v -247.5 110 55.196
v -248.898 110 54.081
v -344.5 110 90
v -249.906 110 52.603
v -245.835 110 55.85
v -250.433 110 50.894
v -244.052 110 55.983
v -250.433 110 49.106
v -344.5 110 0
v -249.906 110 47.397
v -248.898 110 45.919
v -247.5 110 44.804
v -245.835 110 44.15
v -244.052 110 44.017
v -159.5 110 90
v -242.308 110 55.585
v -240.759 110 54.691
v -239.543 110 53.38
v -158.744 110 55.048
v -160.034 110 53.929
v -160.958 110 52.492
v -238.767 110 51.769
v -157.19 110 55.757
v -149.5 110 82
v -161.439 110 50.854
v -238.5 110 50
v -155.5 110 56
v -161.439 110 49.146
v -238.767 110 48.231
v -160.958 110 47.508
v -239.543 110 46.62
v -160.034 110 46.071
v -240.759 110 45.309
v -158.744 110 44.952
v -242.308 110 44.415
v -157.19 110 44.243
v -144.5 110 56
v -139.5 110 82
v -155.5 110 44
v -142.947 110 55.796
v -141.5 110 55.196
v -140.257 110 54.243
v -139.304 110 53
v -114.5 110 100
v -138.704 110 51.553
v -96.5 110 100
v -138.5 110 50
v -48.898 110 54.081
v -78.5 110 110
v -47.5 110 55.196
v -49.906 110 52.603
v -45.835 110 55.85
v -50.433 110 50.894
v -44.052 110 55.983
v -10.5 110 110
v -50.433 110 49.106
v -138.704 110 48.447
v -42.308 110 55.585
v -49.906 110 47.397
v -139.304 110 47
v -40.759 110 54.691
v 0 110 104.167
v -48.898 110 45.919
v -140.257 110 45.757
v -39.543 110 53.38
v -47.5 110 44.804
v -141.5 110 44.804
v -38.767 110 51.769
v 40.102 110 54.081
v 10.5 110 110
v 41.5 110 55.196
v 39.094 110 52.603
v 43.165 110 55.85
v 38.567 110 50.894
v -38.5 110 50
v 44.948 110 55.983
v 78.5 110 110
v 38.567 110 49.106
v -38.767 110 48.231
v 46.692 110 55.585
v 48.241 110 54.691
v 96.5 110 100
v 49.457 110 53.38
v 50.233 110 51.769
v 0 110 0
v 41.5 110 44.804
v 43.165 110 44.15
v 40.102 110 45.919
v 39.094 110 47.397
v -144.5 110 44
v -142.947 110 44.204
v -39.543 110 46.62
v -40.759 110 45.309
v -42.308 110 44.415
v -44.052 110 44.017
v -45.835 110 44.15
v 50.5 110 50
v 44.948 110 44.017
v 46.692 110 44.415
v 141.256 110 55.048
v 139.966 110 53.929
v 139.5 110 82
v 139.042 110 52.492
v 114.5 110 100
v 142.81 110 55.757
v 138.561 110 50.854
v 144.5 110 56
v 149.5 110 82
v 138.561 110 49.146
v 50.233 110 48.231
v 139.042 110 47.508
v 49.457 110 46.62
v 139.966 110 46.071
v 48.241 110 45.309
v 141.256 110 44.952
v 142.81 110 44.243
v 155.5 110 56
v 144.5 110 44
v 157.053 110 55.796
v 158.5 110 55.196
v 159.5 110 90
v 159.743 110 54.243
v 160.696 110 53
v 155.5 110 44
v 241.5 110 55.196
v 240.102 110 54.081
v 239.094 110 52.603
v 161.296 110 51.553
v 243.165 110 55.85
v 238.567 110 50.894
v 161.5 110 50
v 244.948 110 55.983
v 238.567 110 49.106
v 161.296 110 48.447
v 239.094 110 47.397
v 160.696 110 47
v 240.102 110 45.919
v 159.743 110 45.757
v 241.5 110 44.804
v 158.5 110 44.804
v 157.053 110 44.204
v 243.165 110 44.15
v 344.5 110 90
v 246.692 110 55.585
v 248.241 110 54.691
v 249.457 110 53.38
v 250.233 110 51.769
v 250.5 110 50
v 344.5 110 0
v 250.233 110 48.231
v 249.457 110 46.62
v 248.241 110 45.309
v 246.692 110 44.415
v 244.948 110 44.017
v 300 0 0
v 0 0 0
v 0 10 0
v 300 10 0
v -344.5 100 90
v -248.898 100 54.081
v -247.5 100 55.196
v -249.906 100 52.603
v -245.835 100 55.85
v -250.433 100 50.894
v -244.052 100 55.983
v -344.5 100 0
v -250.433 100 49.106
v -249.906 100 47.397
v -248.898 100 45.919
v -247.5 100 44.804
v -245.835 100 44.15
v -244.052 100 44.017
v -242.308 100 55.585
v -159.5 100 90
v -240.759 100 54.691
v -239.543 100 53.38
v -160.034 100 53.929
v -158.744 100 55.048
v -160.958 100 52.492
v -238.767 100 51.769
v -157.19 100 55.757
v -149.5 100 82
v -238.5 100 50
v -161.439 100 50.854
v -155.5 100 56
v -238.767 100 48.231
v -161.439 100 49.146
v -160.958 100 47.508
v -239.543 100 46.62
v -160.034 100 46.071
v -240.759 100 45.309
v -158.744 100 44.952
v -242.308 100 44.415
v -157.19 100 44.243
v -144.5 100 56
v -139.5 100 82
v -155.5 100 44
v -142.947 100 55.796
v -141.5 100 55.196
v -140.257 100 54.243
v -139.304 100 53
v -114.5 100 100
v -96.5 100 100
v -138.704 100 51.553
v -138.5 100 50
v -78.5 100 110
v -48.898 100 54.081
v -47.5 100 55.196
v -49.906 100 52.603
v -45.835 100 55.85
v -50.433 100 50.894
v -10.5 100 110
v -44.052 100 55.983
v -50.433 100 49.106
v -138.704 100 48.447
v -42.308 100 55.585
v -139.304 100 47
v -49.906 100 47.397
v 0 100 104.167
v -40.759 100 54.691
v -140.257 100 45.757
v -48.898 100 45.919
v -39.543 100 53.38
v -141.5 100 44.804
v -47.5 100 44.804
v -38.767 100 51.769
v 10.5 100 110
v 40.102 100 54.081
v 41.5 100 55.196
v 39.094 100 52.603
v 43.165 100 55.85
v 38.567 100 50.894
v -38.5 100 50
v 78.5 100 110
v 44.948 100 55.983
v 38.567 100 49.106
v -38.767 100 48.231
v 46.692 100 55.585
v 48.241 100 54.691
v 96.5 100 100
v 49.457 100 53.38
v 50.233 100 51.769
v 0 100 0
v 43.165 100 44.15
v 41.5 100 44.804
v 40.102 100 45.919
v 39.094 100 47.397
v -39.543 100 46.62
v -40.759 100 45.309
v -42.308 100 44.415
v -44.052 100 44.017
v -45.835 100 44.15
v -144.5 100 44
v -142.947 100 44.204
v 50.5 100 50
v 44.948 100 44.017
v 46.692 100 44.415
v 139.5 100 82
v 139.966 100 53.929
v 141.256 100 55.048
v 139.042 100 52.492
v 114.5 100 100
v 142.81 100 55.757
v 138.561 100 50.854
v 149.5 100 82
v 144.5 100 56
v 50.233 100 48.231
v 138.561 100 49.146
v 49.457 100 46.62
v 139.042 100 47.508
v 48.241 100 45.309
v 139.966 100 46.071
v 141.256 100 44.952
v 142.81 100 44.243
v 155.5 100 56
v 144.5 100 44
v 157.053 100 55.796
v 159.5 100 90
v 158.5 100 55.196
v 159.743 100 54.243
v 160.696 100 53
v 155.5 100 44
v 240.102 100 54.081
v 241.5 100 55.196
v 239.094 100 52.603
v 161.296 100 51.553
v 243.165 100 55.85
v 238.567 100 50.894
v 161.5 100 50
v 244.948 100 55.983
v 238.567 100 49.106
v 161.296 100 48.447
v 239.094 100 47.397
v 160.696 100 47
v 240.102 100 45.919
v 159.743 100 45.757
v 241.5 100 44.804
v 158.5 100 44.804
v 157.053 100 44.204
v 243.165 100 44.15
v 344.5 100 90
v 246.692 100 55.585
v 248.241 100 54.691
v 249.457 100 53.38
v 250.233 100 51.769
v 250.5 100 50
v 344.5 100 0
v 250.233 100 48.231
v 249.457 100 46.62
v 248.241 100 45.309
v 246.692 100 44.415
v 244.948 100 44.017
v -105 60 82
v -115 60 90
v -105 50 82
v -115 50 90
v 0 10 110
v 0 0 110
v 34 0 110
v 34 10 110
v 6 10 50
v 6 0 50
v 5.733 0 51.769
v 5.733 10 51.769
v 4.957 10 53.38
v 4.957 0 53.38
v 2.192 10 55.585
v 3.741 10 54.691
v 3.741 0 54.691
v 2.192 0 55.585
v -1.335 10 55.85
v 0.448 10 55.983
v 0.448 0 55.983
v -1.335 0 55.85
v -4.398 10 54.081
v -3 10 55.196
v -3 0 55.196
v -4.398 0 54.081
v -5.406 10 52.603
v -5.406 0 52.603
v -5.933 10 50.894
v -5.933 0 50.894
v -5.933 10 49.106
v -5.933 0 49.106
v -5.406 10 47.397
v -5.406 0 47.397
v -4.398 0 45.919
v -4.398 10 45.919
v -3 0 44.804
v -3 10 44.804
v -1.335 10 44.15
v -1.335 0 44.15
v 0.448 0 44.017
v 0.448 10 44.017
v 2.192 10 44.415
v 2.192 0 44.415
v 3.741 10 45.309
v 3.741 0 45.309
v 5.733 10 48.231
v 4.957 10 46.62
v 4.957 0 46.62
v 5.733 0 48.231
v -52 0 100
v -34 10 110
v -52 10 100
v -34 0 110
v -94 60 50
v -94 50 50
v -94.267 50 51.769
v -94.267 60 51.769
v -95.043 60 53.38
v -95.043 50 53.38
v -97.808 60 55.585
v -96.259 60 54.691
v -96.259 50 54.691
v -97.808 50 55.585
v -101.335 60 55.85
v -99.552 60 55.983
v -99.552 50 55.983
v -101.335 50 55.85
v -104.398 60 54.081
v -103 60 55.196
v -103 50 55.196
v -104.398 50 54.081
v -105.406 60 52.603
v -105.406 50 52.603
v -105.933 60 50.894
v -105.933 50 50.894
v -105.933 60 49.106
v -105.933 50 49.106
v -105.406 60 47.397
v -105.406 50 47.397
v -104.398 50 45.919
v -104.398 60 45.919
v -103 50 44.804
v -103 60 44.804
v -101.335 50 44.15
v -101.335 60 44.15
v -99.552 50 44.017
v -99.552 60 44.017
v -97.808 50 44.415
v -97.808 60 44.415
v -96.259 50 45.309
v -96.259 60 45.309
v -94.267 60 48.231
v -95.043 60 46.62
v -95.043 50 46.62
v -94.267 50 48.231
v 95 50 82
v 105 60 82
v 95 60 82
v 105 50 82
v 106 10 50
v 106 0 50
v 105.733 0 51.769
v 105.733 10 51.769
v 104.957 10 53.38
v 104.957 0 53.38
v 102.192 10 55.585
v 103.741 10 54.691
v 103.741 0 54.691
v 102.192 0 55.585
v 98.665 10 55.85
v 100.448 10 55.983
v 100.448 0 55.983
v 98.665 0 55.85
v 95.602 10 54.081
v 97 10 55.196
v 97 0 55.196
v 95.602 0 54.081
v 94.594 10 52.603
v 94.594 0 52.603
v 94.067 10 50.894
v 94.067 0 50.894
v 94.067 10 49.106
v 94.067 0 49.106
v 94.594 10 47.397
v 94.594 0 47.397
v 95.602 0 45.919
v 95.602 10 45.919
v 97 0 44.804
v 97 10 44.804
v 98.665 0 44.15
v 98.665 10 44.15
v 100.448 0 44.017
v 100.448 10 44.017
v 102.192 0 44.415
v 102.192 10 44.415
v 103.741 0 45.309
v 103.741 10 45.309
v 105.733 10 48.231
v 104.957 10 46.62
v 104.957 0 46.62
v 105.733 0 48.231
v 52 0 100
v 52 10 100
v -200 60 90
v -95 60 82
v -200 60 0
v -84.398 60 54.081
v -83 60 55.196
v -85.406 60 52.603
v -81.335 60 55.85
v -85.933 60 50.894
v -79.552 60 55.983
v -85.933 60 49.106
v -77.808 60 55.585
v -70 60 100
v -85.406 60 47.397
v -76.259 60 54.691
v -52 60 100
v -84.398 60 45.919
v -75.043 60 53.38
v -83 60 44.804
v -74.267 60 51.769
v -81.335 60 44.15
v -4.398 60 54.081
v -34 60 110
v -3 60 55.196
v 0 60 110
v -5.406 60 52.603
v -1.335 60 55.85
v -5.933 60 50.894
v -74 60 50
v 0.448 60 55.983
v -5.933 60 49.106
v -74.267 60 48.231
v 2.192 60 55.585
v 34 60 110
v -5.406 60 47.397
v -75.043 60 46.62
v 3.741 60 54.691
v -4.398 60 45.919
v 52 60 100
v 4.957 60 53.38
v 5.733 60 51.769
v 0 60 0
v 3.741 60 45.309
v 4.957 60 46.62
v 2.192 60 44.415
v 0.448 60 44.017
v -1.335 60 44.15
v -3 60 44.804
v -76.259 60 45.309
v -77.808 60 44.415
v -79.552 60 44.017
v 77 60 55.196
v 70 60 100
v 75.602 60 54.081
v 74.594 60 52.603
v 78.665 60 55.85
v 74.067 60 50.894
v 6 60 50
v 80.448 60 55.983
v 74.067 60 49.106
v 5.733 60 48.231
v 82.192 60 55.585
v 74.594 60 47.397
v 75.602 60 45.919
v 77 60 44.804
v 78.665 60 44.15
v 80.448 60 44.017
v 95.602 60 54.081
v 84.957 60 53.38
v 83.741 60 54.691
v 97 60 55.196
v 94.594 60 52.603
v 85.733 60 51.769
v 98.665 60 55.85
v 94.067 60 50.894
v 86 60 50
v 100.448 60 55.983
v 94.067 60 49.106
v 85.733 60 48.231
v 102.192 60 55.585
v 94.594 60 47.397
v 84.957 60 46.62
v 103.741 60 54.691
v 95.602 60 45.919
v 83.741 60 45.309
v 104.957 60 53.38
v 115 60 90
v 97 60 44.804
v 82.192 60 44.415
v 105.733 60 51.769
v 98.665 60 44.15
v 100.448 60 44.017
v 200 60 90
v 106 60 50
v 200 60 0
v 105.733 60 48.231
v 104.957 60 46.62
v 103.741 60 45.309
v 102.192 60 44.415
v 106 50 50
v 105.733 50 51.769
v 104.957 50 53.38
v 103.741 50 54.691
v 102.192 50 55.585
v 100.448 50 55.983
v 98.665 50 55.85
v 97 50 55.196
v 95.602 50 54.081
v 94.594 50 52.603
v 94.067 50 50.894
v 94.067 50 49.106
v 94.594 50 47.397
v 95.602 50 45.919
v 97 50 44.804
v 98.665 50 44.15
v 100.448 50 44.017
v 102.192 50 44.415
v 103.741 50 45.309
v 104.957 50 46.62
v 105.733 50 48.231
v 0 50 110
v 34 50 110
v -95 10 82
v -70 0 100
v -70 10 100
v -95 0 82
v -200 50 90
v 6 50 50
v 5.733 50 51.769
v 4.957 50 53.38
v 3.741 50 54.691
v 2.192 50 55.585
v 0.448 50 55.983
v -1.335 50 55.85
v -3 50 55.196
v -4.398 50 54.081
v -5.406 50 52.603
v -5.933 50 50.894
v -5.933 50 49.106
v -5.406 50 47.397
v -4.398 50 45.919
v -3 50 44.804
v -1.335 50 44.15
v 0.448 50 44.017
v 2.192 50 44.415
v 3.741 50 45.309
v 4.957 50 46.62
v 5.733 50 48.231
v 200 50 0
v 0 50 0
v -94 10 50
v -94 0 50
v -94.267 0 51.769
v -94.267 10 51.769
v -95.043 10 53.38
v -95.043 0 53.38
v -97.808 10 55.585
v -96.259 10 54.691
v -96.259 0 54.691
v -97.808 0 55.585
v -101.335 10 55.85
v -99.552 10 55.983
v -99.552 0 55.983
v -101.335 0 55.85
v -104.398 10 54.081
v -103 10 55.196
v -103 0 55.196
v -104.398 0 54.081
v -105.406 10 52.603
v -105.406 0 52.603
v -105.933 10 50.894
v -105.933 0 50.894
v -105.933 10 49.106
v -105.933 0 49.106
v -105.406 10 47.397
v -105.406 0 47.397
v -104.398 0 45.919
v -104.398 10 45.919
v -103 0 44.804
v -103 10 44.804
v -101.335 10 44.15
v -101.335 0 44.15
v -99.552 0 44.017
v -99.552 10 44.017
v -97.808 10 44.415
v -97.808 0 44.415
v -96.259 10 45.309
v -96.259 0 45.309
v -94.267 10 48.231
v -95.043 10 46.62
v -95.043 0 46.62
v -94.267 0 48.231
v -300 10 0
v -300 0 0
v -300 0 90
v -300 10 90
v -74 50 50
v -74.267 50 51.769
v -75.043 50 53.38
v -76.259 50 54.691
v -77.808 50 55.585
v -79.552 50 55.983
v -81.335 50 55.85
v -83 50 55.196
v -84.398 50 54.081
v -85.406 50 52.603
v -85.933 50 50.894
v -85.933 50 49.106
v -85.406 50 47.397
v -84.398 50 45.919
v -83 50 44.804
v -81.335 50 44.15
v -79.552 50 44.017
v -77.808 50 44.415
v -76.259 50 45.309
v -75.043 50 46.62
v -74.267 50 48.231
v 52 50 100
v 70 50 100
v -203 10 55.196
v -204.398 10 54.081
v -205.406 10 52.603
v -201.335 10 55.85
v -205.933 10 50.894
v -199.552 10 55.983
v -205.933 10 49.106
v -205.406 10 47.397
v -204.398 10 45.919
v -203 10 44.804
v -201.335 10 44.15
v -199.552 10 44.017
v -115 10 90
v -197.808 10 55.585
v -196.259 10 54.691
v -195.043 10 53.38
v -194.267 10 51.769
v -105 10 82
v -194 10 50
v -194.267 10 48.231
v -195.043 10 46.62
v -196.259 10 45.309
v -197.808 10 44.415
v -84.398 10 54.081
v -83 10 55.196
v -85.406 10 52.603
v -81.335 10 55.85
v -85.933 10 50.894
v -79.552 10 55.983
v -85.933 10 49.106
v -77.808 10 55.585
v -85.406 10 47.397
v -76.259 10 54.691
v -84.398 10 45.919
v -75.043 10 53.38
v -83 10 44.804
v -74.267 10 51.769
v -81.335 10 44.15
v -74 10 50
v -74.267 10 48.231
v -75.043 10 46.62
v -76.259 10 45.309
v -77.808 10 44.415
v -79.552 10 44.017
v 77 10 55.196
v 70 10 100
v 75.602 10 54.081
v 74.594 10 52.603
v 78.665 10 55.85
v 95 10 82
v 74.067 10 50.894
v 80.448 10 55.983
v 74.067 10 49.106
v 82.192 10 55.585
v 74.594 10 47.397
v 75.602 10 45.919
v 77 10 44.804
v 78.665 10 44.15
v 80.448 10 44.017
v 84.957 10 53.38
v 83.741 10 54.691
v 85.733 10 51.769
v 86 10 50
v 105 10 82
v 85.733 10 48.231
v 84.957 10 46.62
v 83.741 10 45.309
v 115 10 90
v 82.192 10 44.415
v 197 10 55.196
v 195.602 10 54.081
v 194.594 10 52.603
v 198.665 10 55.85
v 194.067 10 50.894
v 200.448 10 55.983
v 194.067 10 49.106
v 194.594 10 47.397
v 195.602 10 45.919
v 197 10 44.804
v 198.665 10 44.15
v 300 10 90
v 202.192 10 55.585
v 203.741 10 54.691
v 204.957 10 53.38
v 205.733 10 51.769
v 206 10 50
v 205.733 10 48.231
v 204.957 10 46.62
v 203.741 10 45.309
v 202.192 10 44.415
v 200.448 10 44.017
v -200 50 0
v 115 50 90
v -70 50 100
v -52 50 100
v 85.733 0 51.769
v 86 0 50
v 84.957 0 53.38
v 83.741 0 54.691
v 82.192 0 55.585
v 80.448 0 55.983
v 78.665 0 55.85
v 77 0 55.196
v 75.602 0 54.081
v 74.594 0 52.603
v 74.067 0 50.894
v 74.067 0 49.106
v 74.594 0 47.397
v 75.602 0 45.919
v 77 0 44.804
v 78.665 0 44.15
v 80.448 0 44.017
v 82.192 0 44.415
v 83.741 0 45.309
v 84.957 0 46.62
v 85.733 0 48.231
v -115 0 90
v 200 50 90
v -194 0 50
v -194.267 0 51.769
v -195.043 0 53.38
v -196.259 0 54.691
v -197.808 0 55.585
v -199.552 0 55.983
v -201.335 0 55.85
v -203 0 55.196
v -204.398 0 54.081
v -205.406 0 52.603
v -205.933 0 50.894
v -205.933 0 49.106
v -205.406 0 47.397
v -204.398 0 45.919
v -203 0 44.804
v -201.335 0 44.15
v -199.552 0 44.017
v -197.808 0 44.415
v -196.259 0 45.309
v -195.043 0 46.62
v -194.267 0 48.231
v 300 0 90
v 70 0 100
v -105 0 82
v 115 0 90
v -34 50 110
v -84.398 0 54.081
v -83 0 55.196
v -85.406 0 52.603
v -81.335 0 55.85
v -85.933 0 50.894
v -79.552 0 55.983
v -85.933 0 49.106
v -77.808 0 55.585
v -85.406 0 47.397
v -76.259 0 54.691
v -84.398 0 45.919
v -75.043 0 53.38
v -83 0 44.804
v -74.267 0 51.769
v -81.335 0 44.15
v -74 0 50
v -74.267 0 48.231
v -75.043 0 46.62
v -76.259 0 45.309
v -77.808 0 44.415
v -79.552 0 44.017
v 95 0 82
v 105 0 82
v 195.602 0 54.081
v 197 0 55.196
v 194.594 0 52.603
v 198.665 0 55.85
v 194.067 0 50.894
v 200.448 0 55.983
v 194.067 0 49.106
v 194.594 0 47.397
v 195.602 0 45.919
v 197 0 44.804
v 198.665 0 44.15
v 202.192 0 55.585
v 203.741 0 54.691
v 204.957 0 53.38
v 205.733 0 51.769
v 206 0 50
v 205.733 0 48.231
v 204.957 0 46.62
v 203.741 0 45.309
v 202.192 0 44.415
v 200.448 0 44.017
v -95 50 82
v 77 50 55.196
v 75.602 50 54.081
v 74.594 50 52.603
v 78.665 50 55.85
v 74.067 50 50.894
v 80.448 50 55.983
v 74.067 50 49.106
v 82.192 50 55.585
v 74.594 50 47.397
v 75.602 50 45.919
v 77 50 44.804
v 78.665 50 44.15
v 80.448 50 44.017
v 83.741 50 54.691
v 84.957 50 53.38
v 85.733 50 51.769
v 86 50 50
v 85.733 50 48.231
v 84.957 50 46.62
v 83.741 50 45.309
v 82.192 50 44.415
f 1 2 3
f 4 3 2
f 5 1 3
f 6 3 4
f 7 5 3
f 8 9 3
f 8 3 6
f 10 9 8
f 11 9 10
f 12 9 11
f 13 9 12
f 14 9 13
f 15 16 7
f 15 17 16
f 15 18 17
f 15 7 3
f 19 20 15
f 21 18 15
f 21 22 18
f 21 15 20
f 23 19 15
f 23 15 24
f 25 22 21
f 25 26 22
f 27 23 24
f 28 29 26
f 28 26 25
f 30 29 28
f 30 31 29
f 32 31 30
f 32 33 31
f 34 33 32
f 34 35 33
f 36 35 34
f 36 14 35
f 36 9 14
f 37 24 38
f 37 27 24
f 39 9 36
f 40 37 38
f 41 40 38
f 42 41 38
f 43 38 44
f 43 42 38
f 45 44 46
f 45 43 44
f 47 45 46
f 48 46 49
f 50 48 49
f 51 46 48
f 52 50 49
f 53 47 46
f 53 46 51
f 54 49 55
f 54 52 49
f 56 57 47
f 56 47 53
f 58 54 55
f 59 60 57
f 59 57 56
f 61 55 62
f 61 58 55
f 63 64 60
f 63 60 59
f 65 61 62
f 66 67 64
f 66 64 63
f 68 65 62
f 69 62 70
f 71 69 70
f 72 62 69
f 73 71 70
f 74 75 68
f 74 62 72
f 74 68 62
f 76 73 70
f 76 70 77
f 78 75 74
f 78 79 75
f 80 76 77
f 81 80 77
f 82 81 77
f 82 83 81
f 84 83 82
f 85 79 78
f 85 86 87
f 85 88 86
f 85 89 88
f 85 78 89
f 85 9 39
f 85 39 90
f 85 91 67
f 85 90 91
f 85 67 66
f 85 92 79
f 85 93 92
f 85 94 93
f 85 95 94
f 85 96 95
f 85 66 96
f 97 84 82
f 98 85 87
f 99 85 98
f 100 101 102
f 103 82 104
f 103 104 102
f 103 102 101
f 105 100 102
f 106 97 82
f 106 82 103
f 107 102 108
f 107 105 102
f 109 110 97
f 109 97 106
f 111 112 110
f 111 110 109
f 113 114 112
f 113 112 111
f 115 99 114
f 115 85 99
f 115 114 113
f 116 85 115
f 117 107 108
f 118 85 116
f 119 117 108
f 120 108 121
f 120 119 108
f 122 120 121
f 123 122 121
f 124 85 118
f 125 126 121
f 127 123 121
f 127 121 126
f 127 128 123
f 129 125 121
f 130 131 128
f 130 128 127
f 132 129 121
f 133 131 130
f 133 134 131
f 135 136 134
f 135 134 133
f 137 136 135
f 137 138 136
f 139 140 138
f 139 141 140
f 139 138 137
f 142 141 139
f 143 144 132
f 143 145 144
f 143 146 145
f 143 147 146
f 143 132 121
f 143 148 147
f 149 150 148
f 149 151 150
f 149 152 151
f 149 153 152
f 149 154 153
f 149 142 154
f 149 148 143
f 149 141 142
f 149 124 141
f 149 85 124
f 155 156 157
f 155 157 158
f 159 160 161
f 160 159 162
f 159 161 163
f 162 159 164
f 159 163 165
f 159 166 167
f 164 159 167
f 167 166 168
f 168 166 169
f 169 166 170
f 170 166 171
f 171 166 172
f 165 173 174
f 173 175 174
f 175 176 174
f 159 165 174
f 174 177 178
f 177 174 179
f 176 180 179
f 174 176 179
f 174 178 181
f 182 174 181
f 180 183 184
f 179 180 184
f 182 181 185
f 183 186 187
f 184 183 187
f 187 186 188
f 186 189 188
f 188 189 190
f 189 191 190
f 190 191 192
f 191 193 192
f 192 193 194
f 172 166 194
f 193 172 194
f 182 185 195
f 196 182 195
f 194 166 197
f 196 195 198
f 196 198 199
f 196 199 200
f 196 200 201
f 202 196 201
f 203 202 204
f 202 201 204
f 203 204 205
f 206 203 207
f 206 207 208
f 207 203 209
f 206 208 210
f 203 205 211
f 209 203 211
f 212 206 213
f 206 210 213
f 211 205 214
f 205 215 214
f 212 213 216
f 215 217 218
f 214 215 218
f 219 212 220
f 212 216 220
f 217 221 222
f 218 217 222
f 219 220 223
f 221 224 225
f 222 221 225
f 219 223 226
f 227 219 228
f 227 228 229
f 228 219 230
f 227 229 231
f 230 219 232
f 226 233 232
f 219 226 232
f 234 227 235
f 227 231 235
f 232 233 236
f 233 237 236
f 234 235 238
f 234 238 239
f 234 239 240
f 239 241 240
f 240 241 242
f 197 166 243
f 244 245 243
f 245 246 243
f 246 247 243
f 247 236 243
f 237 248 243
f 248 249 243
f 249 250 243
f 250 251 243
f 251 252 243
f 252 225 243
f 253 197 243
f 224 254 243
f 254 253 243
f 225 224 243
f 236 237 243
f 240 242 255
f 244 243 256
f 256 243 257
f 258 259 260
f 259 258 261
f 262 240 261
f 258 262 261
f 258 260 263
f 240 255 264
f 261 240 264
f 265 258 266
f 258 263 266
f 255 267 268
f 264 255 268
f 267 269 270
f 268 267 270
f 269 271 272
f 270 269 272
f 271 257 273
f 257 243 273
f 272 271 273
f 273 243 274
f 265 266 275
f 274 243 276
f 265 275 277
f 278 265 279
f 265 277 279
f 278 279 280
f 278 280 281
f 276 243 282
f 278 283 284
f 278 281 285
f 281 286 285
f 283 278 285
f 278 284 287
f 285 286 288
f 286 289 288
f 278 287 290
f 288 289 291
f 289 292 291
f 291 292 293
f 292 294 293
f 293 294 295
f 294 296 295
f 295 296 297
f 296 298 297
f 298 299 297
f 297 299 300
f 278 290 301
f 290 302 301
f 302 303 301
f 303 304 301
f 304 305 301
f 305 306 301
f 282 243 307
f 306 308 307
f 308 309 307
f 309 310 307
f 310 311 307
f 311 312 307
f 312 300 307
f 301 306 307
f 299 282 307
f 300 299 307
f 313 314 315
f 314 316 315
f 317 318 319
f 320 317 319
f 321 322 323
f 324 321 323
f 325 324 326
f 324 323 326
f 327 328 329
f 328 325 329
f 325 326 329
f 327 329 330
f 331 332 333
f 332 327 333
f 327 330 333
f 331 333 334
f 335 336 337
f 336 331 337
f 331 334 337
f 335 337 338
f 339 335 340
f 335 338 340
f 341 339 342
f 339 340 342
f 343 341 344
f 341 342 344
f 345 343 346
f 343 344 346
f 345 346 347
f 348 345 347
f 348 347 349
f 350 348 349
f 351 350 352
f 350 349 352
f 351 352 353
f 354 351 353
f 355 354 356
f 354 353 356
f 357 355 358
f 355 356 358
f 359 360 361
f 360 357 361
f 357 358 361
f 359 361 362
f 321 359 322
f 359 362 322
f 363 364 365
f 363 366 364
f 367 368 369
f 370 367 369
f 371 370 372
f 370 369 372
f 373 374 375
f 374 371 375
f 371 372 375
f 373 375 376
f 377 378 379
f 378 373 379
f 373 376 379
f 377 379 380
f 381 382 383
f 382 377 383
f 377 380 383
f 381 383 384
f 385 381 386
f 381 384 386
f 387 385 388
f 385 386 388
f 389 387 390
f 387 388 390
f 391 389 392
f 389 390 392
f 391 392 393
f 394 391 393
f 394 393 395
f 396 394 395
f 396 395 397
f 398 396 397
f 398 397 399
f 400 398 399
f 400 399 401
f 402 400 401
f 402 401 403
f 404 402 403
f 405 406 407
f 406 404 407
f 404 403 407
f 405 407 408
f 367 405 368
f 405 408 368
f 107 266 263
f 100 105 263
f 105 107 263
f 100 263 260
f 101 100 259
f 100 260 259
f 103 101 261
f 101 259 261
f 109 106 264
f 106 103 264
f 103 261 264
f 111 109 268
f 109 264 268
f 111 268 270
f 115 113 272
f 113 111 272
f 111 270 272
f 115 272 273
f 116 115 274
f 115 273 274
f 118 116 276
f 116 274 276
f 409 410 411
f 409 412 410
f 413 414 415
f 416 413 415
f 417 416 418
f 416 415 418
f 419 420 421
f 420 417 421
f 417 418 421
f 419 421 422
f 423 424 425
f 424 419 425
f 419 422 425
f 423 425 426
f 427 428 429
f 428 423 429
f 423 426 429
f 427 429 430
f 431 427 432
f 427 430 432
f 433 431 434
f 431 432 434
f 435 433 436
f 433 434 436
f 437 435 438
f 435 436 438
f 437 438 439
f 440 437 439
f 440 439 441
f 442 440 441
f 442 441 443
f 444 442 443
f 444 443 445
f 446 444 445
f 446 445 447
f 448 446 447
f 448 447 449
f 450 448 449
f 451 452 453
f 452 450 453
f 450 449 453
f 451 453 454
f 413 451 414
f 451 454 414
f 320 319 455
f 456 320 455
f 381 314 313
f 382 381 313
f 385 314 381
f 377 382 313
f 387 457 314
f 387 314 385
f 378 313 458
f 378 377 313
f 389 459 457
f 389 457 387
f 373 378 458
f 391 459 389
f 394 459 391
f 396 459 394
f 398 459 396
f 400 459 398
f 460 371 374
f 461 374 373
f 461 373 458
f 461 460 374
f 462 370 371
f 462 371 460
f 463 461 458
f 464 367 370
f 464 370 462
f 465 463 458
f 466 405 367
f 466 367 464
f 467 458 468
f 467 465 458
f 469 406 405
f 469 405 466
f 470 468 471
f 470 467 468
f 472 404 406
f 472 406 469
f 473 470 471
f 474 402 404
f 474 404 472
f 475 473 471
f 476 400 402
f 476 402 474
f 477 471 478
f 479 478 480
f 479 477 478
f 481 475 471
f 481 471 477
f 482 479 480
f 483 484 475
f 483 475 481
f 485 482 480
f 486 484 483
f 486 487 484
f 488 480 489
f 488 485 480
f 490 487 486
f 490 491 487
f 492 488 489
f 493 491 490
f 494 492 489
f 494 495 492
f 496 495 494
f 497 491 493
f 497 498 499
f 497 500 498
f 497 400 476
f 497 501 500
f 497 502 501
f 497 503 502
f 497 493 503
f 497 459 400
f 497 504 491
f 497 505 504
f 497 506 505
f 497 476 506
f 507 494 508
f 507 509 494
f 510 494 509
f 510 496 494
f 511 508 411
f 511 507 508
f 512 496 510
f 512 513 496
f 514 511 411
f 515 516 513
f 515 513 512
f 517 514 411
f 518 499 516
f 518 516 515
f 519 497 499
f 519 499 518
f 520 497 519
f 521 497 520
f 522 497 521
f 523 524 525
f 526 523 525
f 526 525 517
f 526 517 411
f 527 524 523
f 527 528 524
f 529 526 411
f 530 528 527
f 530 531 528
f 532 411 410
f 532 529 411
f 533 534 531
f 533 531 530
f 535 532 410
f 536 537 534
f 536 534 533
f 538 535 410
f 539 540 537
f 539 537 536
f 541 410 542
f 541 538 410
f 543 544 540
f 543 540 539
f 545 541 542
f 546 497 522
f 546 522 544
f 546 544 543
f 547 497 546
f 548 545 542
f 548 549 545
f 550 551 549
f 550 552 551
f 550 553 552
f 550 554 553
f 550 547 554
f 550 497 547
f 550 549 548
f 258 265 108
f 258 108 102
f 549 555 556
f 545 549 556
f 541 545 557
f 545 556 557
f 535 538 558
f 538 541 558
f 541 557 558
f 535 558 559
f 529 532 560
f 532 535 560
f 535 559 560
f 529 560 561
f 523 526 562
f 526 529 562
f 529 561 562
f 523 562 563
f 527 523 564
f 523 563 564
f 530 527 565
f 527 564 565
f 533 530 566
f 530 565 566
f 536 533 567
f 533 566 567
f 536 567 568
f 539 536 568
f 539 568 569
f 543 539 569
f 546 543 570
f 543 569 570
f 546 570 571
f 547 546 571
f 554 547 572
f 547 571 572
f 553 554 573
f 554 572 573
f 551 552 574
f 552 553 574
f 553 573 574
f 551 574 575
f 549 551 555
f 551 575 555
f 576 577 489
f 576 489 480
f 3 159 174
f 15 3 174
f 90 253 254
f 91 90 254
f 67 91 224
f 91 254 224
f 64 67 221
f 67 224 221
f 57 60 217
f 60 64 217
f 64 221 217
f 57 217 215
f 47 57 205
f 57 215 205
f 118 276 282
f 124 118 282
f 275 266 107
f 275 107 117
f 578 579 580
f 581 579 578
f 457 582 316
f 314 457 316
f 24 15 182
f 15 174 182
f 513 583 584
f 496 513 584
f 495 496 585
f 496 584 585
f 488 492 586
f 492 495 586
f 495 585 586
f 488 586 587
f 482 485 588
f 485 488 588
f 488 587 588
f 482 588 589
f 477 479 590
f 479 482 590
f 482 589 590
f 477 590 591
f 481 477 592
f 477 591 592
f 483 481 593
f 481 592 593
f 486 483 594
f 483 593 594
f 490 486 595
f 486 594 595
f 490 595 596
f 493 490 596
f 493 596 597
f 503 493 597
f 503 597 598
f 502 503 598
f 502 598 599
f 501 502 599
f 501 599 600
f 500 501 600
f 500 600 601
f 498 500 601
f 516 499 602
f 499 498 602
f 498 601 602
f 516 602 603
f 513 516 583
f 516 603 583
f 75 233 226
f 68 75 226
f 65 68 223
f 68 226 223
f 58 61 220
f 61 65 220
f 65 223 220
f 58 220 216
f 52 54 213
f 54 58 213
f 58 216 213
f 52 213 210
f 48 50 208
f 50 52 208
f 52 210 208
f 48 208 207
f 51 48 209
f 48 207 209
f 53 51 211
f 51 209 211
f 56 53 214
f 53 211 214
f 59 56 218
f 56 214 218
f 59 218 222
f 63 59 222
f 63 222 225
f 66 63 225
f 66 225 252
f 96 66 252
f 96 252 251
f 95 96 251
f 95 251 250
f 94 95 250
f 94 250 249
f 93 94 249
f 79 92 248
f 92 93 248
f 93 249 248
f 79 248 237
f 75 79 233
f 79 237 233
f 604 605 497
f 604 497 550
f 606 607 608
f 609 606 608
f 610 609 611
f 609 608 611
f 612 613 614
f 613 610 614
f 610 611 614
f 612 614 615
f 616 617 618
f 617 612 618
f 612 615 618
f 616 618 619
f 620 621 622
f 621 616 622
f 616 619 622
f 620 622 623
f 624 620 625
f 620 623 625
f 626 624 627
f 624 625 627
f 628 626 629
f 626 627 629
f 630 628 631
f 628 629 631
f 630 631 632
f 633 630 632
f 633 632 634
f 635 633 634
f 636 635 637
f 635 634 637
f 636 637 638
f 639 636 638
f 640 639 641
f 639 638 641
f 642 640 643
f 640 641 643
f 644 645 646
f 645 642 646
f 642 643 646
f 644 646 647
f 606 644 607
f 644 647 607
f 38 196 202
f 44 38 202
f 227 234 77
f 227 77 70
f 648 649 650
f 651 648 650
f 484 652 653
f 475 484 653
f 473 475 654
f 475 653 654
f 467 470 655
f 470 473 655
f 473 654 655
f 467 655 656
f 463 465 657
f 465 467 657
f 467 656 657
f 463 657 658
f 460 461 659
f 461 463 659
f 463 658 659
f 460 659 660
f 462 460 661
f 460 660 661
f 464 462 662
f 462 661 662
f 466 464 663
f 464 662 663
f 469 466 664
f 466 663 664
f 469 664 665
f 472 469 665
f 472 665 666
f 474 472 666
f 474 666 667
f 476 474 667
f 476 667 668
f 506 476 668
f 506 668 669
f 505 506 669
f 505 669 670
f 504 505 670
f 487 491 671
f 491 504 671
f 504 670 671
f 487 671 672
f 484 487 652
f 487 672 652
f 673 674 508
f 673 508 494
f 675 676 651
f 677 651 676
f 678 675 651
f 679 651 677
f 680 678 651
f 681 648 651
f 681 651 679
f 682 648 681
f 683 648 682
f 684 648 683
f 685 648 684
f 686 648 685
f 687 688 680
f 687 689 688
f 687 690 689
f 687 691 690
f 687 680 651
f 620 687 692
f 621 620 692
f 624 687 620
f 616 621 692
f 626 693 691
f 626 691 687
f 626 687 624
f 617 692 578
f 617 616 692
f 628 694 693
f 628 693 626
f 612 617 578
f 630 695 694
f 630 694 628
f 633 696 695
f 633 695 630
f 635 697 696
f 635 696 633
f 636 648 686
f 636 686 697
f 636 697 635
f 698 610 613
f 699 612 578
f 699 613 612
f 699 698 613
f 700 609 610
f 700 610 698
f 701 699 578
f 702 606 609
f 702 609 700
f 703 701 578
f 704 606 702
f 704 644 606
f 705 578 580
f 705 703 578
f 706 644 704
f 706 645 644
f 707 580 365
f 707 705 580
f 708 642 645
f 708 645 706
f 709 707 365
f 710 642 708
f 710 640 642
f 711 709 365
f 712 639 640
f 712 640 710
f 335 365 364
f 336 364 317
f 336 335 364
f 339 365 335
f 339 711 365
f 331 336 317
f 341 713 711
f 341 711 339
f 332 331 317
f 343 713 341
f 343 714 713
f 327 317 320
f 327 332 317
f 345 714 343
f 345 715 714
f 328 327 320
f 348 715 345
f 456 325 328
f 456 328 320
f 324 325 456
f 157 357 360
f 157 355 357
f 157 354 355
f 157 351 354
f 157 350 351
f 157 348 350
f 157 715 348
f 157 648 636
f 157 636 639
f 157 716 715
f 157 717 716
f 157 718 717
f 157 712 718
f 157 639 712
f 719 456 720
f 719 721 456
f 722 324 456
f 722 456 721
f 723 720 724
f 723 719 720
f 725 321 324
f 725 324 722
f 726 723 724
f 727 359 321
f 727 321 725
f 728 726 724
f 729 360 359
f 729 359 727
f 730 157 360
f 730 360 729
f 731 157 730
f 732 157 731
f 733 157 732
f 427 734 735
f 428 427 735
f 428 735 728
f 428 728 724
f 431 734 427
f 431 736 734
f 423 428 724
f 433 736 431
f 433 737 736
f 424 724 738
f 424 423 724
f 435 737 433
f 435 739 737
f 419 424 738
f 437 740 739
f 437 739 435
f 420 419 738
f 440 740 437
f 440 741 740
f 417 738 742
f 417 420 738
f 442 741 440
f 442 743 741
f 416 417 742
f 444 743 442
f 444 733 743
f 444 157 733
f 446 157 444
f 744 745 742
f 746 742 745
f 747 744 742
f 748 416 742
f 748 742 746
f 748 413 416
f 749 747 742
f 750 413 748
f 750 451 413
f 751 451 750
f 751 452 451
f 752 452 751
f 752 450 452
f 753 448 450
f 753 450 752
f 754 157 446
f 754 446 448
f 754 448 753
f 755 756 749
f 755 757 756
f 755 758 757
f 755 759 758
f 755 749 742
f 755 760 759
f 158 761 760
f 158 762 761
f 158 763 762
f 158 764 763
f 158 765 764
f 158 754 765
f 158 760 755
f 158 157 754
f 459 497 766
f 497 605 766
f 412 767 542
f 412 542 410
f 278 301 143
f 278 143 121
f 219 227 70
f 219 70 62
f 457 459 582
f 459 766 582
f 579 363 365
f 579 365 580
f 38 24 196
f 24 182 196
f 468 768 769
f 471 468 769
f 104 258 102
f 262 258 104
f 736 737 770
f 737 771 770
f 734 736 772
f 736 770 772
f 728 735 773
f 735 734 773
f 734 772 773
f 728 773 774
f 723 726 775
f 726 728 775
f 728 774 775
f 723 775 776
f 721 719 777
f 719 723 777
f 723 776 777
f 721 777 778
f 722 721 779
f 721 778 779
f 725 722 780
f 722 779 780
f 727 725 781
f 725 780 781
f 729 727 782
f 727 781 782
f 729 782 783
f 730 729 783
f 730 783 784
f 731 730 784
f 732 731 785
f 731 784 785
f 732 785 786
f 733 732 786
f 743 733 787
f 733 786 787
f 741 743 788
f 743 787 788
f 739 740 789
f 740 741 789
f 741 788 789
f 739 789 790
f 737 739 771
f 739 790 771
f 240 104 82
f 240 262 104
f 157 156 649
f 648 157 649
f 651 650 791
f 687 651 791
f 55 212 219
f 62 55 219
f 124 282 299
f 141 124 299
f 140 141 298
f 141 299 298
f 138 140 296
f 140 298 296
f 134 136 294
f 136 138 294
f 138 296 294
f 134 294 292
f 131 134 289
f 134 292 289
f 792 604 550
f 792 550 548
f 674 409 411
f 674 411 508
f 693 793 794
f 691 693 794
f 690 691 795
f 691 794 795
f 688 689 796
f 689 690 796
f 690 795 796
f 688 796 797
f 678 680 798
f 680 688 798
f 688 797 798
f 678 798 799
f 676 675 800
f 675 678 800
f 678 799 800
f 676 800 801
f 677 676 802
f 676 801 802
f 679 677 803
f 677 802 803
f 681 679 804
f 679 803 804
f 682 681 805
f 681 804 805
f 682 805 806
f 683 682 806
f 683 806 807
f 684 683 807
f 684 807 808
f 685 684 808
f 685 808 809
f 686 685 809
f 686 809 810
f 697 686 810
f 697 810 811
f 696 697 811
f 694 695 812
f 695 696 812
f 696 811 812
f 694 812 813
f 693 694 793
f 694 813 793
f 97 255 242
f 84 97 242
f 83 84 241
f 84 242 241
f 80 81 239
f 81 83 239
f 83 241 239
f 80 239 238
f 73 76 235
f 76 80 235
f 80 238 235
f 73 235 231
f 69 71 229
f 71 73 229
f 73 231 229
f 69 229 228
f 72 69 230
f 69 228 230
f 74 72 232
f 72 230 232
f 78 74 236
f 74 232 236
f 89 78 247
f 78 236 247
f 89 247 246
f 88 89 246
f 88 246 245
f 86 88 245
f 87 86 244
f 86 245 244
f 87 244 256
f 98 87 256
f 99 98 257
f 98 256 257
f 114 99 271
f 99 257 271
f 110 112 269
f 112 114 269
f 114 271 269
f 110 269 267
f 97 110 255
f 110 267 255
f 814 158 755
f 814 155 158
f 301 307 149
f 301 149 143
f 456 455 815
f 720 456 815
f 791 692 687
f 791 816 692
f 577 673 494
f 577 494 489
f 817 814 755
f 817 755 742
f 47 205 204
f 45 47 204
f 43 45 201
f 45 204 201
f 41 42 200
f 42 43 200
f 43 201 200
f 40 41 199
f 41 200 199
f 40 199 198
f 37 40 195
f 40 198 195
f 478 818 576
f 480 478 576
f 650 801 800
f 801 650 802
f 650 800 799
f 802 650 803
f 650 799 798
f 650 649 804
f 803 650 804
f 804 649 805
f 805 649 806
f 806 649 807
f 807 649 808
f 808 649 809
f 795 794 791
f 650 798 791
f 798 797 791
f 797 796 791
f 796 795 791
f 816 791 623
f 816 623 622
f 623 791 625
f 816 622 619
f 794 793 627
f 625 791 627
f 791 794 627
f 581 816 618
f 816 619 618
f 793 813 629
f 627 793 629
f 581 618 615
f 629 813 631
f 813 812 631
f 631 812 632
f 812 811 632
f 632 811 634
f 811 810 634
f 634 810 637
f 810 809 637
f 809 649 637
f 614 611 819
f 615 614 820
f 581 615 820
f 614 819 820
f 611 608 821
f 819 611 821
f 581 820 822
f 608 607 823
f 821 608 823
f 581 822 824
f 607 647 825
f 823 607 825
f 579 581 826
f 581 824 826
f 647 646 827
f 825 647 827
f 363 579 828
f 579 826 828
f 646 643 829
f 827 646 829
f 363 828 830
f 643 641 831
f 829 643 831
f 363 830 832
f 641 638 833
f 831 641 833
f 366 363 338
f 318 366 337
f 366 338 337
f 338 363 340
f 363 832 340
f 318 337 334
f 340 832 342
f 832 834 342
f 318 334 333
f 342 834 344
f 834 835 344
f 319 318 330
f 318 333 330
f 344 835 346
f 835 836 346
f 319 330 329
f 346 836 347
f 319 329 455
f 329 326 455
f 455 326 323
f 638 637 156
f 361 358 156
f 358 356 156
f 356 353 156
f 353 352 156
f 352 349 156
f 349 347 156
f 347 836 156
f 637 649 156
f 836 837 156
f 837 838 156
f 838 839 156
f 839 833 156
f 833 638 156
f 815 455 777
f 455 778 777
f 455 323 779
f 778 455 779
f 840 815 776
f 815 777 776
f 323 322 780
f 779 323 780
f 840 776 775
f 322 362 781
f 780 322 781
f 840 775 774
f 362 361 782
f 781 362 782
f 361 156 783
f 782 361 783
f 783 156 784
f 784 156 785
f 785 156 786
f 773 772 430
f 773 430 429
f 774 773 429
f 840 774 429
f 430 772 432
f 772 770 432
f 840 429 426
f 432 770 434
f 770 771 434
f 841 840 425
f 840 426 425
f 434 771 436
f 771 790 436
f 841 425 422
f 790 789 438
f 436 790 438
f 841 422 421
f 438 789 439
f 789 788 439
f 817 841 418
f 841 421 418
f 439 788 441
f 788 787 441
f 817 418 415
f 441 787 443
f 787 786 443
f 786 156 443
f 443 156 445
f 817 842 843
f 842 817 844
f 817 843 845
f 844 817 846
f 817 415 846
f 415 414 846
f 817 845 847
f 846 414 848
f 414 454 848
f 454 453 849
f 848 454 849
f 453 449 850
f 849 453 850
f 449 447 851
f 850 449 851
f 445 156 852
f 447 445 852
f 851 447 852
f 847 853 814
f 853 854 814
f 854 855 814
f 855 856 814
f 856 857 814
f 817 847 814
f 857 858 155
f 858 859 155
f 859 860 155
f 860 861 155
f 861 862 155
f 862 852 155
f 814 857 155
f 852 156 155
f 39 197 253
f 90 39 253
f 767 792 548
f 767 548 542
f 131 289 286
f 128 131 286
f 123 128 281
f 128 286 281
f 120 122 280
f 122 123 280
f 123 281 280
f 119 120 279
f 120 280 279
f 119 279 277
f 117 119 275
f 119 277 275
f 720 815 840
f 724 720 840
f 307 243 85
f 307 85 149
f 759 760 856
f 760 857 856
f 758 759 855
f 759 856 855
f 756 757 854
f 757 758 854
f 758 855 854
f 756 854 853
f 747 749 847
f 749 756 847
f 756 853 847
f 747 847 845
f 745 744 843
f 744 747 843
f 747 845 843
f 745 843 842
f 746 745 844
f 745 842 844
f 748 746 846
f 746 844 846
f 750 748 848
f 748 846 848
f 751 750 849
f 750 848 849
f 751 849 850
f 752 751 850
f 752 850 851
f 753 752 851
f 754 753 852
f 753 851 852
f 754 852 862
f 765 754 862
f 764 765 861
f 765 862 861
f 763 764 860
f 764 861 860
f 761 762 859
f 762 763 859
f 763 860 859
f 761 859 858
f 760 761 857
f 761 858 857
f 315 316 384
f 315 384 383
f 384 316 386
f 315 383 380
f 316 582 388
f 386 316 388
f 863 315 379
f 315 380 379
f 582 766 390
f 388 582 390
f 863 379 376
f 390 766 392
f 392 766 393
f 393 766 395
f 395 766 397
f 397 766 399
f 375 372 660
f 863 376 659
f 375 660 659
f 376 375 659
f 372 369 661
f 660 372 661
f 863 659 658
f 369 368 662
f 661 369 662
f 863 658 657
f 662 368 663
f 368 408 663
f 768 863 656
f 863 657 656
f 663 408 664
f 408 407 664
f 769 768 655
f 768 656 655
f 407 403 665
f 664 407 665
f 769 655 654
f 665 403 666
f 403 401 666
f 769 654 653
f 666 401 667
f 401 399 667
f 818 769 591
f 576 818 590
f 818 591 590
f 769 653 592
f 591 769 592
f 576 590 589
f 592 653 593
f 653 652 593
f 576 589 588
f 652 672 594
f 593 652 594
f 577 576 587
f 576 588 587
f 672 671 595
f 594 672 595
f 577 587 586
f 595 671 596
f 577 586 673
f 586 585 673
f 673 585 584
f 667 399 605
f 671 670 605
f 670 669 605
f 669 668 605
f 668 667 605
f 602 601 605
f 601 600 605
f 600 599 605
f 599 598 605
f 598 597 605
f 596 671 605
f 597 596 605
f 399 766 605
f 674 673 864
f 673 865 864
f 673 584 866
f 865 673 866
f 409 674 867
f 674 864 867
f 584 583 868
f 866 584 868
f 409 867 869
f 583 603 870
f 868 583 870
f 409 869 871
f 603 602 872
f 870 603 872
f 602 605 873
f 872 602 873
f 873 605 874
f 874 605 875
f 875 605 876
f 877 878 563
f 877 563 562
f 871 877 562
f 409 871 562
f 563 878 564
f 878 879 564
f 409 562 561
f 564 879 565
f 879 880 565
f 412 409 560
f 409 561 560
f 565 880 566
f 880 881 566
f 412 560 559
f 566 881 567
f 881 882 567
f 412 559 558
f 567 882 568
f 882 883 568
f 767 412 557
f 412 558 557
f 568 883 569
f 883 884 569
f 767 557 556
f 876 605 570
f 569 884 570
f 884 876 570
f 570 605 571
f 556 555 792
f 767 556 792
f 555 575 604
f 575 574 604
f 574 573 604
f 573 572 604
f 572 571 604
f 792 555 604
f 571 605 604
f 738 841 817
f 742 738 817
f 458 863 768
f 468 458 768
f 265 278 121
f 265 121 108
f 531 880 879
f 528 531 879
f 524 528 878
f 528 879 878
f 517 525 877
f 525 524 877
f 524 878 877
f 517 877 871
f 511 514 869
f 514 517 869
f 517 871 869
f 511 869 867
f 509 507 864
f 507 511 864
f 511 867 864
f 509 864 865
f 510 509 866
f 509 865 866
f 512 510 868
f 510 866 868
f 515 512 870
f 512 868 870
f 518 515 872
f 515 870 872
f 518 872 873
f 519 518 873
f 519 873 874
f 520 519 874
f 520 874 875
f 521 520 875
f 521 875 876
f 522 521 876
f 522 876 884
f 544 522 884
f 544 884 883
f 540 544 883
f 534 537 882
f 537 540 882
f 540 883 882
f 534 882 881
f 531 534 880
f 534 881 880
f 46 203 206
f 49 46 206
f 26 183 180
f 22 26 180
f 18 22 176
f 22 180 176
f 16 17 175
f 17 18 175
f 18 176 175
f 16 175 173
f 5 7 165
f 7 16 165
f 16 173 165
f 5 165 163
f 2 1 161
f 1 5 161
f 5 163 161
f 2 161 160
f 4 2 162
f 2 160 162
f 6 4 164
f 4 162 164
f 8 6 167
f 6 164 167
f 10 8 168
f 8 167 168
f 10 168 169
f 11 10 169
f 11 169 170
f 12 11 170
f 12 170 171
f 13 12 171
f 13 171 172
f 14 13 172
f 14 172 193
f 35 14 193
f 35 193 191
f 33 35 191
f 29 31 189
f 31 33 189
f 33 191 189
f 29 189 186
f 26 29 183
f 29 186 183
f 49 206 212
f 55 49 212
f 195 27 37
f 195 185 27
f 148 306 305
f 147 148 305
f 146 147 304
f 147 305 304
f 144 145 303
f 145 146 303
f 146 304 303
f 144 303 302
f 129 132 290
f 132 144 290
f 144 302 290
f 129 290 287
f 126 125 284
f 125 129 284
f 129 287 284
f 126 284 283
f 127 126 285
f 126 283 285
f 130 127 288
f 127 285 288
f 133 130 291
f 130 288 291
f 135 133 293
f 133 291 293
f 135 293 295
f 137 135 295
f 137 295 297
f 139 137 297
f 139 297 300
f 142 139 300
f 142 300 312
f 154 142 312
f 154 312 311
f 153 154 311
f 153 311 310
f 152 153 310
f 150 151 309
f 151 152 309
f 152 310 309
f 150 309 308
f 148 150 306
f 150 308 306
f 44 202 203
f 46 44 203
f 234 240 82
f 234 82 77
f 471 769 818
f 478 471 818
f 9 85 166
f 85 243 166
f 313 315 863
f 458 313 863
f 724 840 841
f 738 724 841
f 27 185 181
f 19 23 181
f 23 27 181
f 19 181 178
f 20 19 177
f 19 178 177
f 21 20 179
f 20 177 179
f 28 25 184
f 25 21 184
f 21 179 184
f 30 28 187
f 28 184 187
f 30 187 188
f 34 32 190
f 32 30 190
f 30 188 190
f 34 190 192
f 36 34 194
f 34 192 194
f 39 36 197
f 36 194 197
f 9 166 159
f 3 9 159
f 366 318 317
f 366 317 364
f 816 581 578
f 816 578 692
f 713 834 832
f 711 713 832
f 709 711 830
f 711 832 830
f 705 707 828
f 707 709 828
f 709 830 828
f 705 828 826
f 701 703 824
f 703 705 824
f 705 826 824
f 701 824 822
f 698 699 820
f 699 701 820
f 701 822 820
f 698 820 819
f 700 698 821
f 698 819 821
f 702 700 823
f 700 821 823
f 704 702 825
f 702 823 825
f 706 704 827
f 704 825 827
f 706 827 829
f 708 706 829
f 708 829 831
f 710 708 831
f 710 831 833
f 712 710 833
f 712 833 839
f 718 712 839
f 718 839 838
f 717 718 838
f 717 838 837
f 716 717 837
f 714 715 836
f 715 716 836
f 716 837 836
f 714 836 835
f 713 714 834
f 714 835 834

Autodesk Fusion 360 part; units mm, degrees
sketch "Skizze1" plane through (0, 0, 0) normal (0, 1, 0) x (1, 0, 0) in component "FREMO_600mm"
  line L0 (0, 0) -> (0, -110) construction
  line L1 (0, 0) -> (-300, 0)
  line L2 (-300, 0) -> (-300, -90)
  line L3 (-300, -90) -> (-115, -90)
  line L4 (0, -110) -> (-34, -110)
  line L5 (-34, -110) -> (-52, -100)
  line L6 (-52, -100) -> (-70, -100)
  line L7 (-70, -100) -> (-95, -82)
  line L8 (-95, -82) -> (-105, -82)
  line L9 (-105, -82) -> (-115, -90)
  line L10 (-300, -50) -> (0, -50) construction
  circle A0 centre (-100, -50) radius 6
  circle A1 centre (-80, -50) radius 6
  circle A2 centre (-200, -50) radius 6
  line L11 (0, -110) -> (34, -110)
  line L12 (34, -110) -> (52, -100)
  line L13 (52, -100) -> (70, -100)
  line L14 (70, -100) -> (95, -82)
  line L15 (95, -82) -> (105, -82)
  line L16 (105, -82) -> (115, -90)
  line L17 (300, -90) -> (115, -90)
  line L18 (300, 0) -> (300, -90)
  line L19 (0, 0) -> (300, 0)
  circle A3 centre (200, -50) radius 6
  circle A4 centre (100, -50) radius 6
  circle A5 centre (80, -50) radius 6
  circle A6 centre (0, -50) radius 6
  dimension "d13" = 34
  dimension "d14" = 18
  dimension "d15" = 18
  dimension "d16" = 10
  dimension "d17" = 25
  dimension "d18" = 10
  dimension "d19" = 10
  dimension "d20" = 100
  dimension "d21" = 90
  dimension "d22" = 8
  dimension "d23" = 300
  dimension "d24" = 12
  dimension "d25" = 12
  dimension "d26" = 12
  dimension "d27" = 50
  dimension "d28" = 80
  dimension "d29" = 100
  dimension "d30" = 200
  dimension "d31" = 12
extrude "Extrusion1" add sketch "Skizze1" along normal blind 10 makes body 1 in component "FREMO_600mm"
sketch "Skizze2" plane through (0, 0, 0) normal (0, 1, 0) x (1, 0, 0) in component "FREMO_400mm"
  line L0 (0, 0) -> (0, -110) construction
  line L1 (0, 0) -> (-200, 0)
  line L2 (-200, 0) -> (-200, -90)
  line L3 (-200, -90) -> (-115, -90)
  line L4 (-115, -90) -> (-105, -82)
  line L5 (-105, -82) -> (-95, -82)
  line L6 (-95, -82) -> (-70, -100)
  line L7 (-70, -100) -> (-52, -100)
  line L8 (-52, -100) -> (-34, -110)
  line L9 (-34, -110) -> (0, -110)
  line L10 (-200, -50) -> (0, -50) construction
  circle A0 centre (-100, -50) radius 6
  circle A1 centre (-80, -50) radius 6
  line L11 (34, -110) -> (0, -110)
  line L12 (52, -100) -> (34, -110)
  line L13 (70, -100) -> (52, -100)
  line L14 (95, -82) -> (70, -100)
  line L15 (105, -82) -> (95, -82)
  line L16 (115, -90) -> (105, -82)
  line L17 (200, -90) -> (115, -90)
  line L18 (200, 0) -> (200, -90)
  line L19 (0, 0) -> (200, 0)
  circle A2 centre (100, -50) radius 6
  circle A3 centre (80, -50) radius 6
  circle A4 centre (0, -50) radius 6
  dimension "d52" = 34
  dimension "d53" = 18
  dimension "d54" = 18
  dimension "d55" = 25
  dimension "d56" = 10
  dimension "d57" = 10
  dimension "d58" = 10
  dimension "d59" = 100
  dimension "d60" = 90
  dimension "d61" = 8
  dimension "d62" = 200
  dimension "d63" = 50
  dimension "d64" = 12
  dimension "d65" = 12
  dimension "d66" = 80
  dimension "d67" = 100
  dimension "d68" = 12
extrude "Extrusion2" add sketch "Skizze2" along normal blind 10 separate body makes body 2 in component "FREMO_400mm"
sketch "Skizze1 (2)" plane through (0, 0, 0) normal (0, 1, 0) x (1, 0, 0) in component "FREMO_Entwurf_2_Gleisig_689mm"
  line L0 (0, 0) -> (0, -104.1667) construction
  line L1 (0, 0) -> (-344.5, 0)
  line L2 (-344.5, 0) -> (-344.5, -90)
  line L3 (-344.5, -90) -> (-159.5, -90)
  line L4 (-159.5, -90) -> (-149.5, -82)
  line L5 (-149.5, -82) -> (-139.5, -82)
  line L6 (-139.5, -82) -> (-114.5, -100)
  line L7 (-114.5, -100) -> (-96.5, -100)
  line L8 (-96.5, -100) -> (-78.5, -110)
  line L9 (-78.5, -110) -> (-10.5, -110)
  line L10 (-44.5, -110) -> (-44.5, 0) construction
  line L11 (-44.5, -50) -> (-344.5, -50) construction
  circle A0 centre (-44.5, -50) radius 6
  circle A1 centre (-144.5, -50) radius 6
  circle A2 centre (-244.5, -50) radius 6
  line L12 (-96.5, -100) -> (7.5, -100) construction
  line L13 (-10.5, -110) -> (0, -104.1667)
  line L14 (0, -104.1667) -> (7.5, -100) construction
  line L15 (10.5, -110) -> (0, -104.1667)
  line L16 (78.5, -110) -> (10.5, -110)
  line L17 (96.5, -100) -> (78.5, -110)
  line L18 (114.5, -100) -> (96.5, -100)
  line L19 (139.5, -82) -> (114.5, -100)
  line L20 (149.5, -82) -> (139.5, -82)
  line L21 (159.5, -90) -> (149.5, -82)
  line L22 (344.5, -90) -> (159.5, -90)
  line L23 (344.5, 0) -> (344.5, -90)
  line L24 (0, 0) -> (344.5, 0)
  line L25 (44.5, -50) -> (344.5, -50) construction
  circle A3 centre (244.5, -50) radius 6
  circle A4 centre (144.5, -50) radius 6
  circle A5 centre (44.5, -50) radius 6
  line L26 (44.5, -110) -> (44.5, 0) construction
  circle A6 centre (-155.5, -50) radius 6
  circle A7 centre (155.5, -50) radius 6
  line L27 (-155.5, -56) -> (-144.5, -56)
  line L28 (-155.5, -44) -> (-144.5, -44)
  line L29 (144.5, -56) -> (155.5, -56)
  line L30 (144.5, -44) -> (155.5, -44)
  dimension "d71" = 68
  dimension "d72" = 18
  dimension "d73" = 18
  dimension "d74" = 25
  dimension "d75" = 10
  dimension "d76" = 10
  dimension "d77" = 8
  dimension "d78" = 10
  dimension "d79" = 100
  dimension "d80" = 90
  dimension "d81" = 44.5
  dimension "d82" = 300
  dimension "d83" = 12
  dimension "d84" = 12
  dimension "d85" = 12
  dimension "d86" = 100
  dimension "d87" = 200
  dimension "d88" = 50
  dimension "d90" = 18
  dimension "d91" = 12
  dimension "d92" = 12
  dimension "d93" = 200
  dimension "d94" = 200
extrude "Extrusion1'" add sketch "Skizze1 (2)" along normal blind 10 separate body makes body 3 in component "FREMO_Entwurf_2_Gleisig_689mm"
component "FREMO_600mm" placed x (1, 0, 0) y (0, 1, 0) z (0, 0, 1) at (0, 0, 0)
component "FREMO_400mm" placed x (1, 0, 0) y (0, 1, 0) z (0, 0, 1) at (0, 50, 0)
component "FREMO_Entwurf_2_Gleisig_689mm" placed x (1, 0, 0) y (0, 1, 0) z (0, 0, 1) at (0, 100, 0)
equation "d81 = ( 89 / 2 ) * 1 mm"
